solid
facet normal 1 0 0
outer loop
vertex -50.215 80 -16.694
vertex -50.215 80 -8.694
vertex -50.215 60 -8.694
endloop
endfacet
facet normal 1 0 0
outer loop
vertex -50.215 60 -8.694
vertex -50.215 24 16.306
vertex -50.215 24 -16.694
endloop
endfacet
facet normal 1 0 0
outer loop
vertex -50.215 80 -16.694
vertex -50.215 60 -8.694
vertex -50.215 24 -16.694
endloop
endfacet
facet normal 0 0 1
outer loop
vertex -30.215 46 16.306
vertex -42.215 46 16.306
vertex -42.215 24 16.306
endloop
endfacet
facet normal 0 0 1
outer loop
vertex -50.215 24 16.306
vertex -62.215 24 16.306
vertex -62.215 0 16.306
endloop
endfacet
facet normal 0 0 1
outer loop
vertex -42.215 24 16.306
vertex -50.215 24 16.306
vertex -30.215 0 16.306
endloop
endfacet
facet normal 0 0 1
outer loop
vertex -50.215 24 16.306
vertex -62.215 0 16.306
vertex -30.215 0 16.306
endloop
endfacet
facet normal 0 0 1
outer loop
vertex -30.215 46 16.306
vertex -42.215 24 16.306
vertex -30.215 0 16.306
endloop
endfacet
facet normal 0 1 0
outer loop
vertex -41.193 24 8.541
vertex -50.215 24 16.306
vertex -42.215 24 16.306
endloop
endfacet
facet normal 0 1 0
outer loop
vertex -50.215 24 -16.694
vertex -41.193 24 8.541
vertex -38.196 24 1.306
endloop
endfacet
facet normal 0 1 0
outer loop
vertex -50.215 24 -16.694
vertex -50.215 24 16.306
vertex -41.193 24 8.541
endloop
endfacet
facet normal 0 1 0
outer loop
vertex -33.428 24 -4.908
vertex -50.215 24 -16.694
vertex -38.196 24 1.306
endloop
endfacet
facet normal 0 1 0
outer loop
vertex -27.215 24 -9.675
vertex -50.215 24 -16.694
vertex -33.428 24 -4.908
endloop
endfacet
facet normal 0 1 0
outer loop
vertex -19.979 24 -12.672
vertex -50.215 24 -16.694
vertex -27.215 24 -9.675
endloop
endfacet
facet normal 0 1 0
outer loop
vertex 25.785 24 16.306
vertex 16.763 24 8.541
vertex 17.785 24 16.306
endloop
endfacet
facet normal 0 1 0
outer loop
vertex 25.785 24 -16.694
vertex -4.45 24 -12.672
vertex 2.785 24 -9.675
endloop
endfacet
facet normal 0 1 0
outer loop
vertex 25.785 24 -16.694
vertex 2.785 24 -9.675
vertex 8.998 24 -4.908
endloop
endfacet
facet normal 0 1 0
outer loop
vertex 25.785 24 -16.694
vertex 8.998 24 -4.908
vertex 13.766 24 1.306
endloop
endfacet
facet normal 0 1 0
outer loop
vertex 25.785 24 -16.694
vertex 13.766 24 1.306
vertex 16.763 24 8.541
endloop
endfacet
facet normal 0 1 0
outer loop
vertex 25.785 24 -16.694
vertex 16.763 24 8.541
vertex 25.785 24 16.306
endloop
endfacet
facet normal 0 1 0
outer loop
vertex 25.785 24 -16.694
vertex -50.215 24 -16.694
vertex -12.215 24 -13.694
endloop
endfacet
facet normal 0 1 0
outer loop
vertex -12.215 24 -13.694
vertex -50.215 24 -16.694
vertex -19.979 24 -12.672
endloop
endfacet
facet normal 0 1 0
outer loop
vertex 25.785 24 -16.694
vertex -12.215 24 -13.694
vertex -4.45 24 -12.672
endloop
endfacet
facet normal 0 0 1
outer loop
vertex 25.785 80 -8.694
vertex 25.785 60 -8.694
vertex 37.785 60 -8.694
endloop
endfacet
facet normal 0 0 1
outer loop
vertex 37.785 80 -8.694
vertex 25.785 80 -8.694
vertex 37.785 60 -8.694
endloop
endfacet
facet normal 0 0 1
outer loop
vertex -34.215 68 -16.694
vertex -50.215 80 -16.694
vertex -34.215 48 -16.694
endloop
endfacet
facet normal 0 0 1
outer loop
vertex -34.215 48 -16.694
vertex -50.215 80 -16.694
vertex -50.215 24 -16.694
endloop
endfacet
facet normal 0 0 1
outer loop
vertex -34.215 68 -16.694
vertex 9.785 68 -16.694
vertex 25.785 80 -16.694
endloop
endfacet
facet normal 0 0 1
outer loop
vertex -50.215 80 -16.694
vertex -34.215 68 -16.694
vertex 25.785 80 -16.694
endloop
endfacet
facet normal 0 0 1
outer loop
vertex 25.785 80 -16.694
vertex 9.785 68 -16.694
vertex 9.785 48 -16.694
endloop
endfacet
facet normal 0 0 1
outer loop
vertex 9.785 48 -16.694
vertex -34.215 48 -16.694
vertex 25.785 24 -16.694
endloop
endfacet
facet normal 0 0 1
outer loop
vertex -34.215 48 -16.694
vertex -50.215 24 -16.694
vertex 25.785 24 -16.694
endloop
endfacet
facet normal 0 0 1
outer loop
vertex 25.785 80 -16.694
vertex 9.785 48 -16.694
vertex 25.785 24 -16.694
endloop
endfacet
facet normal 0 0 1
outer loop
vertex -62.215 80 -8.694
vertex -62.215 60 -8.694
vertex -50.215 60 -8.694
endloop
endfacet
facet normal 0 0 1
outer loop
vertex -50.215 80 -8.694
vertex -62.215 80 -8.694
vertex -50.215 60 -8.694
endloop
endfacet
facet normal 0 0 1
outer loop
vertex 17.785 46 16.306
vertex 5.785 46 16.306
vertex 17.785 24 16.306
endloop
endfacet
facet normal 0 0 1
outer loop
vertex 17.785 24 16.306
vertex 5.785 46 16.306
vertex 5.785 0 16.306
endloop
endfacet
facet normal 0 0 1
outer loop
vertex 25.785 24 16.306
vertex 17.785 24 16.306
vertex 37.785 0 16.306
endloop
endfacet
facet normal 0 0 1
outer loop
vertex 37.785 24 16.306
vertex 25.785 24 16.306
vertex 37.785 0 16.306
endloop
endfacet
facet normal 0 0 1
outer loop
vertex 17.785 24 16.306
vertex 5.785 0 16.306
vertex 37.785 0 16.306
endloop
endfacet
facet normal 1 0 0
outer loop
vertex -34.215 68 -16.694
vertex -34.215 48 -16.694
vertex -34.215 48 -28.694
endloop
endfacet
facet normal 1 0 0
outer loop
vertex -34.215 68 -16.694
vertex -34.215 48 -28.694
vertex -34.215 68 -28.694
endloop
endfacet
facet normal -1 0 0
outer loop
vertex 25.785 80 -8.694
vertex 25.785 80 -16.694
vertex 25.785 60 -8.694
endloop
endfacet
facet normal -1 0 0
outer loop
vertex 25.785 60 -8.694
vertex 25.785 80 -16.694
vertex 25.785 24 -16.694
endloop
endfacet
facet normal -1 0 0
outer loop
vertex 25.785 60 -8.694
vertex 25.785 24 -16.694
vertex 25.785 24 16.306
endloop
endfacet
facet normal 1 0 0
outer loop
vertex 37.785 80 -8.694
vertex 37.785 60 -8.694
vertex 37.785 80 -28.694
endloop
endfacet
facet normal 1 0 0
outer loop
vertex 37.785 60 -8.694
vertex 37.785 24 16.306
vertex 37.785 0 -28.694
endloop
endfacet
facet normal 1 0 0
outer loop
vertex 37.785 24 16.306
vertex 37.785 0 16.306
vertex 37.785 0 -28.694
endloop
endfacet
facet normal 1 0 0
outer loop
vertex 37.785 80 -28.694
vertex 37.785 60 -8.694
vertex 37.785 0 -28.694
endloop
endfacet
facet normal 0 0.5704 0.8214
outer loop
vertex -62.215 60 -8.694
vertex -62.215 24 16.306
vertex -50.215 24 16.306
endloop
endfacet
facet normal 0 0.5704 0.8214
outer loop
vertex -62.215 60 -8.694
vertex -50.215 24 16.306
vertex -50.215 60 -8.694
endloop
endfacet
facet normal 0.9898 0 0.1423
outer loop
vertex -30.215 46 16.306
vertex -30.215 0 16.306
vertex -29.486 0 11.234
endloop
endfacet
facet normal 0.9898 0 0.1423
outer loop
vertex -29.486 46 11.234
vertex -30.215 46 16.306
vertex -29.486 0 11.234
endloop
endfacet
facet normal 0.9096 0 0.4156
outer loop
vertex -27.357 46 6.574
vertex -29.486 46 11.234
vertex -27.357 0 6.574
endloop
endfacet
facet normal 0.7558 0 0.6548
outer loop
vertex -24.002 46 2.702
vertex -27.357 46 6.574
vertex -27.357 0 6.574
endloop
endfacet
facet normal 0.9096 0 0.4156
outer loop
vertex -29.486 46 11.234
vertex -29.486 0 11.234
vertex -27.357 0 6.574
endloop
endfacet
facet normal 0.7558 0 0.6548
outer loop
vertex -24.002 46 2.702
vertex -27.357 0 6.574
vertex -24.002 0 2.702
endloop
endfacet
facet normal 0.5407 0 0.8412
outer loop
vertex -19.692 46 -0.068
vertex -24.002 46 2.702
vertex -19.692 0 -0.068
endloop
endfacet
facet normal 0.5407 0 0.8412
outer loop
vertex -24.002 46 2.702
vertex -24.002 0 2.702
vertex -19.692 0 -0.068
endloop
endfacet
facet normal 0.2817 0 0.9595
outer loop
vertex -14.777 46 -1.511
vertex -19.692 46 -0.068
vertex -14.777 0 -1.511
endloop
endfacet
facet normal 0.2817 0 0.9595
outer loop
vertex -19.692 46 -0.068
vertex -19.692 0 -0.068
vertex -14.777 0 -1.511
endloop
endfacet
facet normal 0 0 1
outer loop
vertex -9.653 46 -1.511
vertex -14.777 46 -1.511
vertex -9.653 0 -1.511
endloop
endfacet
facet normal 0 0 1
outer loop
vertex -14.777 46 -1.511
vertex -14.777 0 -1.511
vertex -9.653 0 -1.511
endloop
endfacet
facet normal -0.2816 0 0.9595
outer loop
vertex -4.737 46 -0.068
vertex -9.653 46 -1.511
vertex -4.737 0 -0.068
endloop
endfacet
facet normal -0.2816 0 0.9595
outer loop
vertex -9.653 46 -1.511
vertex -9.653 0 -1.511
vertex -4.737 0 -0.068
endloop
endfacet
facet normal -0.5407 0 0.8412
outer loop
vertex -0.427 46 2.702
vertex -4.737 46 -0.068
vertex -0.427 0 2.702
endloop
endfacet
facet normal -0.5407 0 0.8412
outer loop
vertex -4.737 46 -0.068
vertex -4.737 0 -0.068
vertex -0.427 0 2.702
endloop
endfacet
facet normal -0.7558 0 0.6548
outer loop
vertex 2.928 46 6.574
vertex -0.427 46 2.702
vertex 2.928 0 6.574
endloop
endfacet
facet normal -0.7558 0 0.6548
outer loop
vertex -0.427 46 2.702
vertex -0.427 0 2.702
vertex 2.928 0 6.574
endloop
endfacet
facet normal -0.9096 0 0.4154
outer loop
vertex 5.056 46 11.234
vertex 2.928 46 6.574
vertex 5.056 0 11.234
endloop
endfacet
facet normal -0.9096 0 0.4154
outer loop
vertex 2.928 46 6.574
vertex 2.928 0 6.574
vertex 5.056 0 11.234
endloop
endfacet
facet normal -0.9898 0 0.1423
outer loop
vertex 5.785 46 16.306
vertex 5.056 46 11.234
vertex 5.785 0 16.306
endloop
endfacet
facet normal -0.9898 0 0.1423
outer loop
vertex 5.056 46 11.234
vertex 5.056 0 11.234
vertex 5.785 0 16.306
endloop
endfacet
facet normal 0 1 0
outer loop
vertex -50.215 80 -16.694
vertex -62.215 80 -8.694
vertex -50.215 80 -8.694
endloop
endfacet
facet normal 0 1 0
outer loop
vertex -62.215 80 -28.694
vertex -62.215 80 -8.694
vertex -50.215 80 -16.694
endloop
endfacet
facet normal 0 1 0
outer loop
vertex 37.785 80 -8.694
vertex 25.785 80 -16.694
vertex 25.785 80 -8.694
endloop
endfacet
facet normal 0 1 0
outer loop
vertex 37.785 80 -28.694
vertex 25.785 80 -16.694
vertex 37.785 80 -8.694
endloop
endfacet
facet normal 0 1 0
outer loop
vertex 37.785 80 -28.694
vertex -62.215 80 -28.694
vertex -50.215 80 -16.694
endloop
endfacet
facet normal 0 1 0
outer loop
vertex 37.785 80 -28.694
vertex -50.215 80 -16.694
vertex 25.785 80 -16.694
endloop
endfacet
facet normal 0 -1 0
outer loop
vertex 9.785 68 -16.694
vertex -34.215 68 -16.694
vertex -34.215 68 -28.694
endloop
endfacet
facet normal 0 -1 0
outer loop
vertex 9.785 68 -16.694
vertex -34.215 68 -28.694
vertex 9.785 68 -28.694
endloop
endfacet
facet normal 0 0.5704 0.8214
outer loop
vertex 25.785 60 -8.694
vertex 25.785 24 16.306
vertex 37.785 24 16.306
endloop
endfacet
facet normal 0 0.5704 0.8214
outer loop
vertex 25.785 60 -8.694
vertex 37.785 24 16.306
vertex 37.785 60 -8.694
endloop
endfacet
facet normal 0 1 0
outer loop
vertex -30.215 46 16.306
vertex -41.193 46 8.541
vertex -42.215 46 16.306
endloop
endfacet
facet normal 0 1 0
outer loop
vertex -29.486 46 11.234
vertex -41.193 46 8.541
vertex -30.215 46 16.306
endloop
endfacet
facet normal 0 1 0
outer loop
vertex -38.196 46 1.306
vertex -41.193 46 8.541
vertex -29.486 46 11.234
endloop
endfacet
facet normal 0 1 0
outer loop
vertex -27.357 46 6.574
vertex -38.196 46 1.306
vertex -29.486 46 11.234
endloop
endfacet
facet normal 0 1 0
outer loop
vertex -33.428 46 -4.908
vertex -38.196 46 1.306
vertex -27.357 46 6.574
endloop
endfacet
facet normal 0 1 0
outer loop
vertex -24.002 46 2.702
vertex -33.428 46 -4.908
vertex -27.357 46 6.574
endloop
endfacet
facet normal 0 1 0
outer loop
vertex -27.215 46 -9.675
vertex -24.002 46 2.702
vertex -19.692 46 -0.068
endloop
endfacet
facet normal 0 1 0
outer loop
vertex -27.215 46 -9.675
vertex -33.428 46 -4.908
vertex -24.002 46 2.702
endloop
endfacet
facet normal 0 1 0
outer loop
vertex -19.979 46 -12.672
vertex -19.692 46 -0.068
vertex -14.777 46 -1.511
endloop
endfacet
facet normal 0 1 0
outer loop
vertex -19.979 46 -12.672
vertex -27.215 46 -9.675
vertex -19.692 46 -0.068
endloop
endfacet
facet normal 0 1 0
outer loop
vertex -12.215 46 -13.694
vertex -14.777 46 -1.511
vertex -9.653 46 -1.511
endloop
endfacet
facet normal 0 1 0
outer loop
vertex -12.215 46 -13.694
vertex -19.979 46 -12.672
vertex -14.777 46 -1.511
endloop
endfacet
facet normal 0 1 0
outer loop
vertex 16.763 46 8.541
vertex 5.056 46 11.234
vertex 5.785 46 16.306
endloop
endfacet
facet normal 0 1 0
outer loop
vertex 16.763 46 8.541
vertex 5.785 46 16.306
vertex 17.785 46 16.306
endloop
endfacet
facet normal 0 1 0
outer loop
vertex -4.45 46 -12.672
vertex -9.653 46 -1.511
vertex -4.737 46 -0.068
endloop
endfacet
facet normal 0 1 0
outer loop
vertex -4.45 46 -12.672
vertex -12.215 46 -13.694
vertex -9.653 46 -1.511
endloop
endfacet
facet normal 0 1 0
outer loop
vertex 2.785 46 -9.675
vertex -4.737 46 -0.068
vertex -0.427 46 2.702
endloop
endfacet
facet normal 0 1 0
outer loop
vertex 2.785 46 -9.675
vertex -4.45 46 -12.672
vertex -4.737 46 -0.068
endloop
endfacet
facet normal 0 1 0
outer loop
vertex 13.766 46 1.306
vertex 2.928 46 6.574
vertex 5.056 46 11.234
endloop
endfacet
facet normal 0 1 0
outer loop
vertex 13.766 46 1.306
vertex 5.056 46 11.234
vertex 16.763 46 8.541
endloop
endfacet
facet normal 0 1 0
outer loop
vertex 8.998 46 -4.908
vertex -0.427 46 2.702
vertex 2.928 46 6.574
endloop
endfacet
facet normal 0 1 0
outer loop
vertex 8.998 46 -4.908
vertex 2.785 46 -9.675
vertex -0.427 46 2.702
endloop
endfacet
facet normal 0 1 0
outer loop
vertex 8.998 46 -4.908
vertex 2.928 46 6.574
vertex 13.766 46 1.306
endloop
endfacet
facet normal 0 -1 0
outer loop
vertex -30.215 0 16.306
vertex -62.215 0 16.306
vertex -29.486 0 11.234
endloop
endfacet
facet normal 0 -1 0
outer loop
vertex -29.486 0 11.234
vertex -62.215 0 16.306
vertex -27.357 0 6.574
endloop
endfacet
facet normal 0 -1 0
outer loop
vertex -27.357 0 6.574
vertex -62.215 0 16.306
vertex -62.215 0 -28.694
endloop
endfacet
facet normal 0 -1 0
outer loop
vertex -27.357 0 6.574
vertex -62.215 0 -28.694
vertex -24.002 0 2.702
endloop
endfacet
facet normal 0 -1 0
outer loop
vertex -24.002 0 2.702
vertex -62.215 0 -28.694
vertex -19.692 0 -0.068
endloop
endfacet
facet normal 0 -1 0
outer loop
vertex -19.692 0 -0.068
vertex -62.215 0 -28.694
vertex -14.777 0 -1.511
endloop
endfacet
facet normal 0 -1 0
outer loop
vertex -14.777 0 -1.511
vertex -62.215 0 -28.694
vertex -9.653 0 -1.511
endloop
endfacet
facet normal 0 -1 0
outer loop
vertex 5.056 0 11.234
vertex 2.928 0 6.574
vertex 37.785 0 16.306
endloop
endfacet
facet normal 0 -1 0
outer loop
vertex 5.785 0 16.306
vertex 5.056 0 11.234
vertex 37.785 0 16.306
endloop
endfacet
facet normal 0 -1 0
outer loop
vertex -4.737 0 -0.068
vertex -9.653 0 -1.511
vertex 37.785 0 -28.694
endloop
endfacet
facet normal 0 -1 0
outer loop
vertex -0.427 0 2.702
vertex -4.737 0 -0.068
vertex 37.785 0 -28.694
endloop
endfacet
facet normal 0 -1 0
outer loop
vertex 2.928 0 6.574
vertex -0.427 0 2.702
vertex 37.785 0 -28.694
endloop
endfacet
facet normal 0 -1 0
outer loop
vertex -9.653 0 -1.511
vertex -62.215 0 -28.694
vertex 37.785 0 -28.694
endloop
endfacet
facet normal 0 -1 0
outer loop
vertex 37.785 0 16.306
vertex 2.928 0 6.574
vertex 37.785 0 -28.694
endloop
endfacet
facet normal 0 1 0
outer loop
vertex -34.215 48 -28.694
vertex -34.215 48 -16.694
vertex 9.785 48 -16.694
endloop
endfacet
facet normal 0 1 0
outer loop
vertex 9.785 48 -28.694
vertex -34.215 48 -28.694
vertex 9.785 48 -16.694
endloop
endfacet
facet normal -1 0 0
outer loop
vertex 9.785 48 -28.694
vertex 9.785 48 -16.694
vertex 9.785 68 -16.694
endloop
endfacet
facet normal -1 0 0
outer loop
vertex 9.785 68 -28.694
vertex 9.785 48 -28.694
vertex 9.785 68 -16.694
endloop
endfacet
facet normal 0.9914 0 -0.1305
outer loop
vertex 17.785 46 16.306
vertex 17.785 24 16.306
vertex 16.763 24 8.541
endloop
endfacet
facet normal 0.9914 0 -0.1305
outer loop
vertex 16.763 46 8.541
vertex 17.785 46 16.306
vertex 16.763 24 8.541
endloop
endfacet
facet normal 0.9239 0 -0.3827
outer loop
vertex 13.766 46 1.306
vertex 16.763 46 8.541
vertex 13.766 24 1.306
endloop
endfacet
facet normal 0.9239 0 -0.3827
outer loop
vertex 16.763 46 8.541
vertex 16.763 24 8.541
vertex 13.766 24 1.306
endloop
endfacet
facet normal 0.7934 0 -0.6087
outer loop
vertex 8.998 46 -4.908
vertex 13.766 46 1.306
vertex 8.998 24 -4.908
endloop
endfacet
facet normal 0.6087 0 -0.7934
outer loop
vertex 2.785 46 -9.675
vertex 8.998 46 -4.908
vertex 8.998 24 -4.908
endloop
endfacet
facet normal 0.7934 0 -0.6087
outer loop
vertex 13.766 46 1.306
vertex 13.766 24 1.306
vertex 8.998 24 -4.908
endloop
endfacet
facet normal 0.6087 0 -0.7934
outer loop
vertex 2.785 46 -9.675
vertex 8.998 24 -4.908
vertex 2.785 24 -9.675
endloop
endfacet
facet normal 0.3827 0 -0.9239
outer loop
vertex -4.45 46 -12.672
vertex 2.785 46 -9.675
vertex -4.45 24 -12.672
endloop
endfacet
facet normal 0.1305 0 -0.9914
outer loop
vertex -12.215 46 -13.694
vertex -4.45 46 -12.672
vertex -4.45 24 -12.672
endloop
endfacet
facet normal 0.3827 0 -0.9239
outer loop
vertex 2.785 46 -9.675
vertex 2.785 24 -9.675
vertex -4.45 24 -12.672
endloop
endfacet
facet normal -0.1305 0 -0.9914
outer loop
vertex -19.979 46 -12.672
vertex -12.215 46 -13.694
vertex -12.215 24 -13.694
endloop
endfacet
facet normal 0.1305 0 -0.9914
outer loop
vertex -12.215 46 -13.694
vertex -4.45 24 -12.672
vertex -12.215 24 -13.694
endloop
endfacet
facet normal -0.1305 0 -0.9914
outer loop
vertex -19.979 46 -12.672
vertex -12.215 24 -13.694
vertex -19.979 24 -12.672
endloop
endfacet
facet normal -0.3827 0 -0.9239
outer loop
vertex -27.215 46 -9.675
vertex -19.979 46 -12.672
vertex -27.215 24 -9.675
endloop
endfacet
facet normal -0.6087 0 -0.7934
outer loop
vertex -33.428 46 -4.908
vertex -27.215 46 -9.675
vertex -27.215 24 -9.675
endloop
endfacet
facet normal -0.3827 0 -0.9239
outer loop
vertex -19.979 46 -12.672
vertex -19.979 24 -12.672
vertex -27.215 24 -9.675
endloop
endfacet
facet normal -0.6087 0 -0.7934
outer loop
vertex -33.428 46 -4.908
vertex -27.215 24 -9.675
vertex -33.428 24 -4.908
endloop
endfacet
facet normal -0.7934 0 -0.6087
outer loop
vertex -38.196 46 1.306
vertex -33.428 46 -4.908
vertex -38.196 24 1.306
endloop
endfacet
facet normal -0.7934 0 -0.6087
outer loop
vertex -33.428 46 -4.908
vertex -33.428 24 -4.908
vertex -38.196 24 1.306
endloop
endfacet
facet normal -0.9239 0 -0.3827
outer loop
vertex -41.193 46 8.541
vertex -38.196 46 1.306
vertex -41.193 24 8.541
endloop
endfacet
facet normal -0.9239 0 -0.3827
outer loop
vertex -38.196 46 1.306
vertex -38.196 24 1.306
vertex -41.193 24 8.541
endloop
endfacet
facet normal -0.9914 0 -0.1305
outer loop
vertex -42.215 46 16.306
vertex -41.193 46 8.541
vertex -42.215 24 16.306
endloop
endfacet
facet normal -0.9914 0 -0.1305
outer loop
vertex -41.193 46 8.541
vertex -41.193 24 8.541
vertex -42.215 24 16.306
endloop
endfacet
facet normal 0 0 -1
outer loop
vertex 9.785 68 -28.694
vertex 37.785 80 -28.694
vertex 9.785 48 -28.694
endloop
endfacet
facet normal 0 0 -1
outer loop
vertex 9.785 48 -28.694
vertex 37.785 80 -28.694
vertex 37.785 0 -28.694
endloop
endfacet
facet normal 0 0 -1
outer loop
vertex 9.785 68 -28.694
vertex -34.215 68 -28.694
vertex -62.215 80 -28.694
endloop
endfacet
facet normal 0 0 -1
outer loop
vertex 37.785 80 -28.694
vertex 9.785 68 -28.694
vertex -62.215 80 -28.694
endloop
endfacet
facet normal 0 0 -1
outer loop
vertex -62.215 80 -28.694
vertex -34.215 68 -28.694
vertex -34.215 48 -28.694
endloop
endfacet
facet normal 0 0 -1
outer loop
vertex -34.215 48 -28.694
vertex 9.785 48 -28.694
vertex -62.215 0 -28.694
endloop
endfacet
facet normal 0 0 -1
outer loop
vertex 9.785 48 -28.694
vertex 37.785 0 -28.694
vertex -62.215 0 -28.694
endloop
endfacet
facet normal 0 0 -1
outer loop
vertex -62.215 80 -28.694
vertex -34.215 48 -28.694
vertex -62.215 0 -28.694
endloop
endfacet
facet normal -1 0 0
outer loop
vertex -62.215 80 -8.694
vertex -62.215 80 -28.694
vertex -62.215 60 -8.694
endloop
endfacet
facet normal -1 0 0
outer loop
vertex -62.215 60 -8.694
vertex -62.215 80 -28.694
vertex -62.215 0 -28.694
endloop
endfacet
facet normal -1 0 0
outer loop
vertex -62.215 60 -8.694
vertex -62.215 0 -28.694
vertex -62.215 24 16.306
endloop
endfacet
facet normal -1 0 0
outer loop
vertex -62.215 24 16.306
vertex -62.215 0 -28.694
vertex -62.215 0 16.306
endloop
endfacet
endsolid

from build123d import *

# Parameters (mm, degrees)
BOSS_EXTRUDE1_DEPTH = 24
SKETCH1_4_W         = 12
SKETCH1_4_H         = 25
BOSS_EXTRUDE3_DEPTH = 60
BOSS_EXTRUDE5_DEPTH = 80
CUT_EXTRUDE4_DEPTH  = 104
BOSS_EXTRUDE6_DEPTH = 46
SKETCH5_W           = 44
SKETCH5_H           = 20
CUT_EXTRUDE5_DEPTH  = 46


with BuildPart() as part:
    # Sketch1 → Boss-Extrude1 (new body)
    with BuildSketch(Plane(origin=(0, 0, 0), x_dir=(1, 0, 0), z_dir=(0, 1, 0))):
        with BuildLine():
            Line((-50.214859888, 8.694484644), (-50.214859888, -16.305515356))
            Line((-50.214859888, -16.305515356), (-42.214859888, -16.305515356))
            ThreePointArc((-42.214859888, -16.305515356), (-12.214859888, 13.694484644), (17.785140112, -16.305515356))
            Line((17.785140112, -16.305515356), (25.785140112, -16.305515356))
            Line((25.785140112, -16.305515356), (25.785140112, 8.694484644))
            Line((25.785140112, 8.694484644), (25.785140112, 16.694484644))
            Line((25.785140112, 16.694484644), (-50.214859888, 16.694484644))
            Line((-50.214859888, 16.694484644), (-50.214859888, 8.694484644))
        make_face()
    extrude(amount=BOSS_EXTRUDE1_DEPTH)

    # Sketch1<4> → Boss-Extrude3 (add)
    with BuildSketch(Plane(origin=(0, 0, 0), x_dir=(1, 0, 0), z_dir=(0, 1, 0))):
        with Locations((-56.214859888, -3.805515356)):
            Rectangle(SKETCH1_4_W, SKETCH1_4_H)
        with Locations((31.785140112, -3.805515356)):
            Rectangle(SKETCH1_4_W, SKETCH1_4_H)
    extrude(amount=BOSS_EXTRUDE3_DEPTH)

    # Sketch1<7> → Boss-Extrude5 (add)
    with BuildSketch(Plane(origin=(0, 0, 0), x_dir=(1, 0, 0), z_dir=(0, 1, 0))):
        Polygon((-62.214859888, 28.694484644), (-62.214859888, 8.694484644), (-50.214859888, 8.694484644), (-50.214859888, 16.694484644), (25.785140112, 16.694484644), (25.785140112, 8.694484644), (37.785140112, 8.694484644), (37.785140112, 28.694484644), align=None)
    extrude(amount=BOSS_EXTRUDE5_DEPTH)

    # Sketch3 → Cut-Extrude4 (cut)
    with BuildSketch(Plane.ZY.offset(62.214859888)):
        Polygon((16.305515356, 24), (-8.694484644, 60), (16.305515356, 60), align=None)
    extrude(amount=-CUT_EXTRUDE4_DEPTH, mode=Mode.SUBTRACT)

    # Sketch1<8> → Boss-Extrude6 (add)
    with BuildSketch(Plane(origin=(0, 0, 0), x_dir=(1, 0, 0), z_dir=(0, 1, 0))):
        with BuildLine():
            ThreePointArc((17.785140112, -16.305515356), (-12.214859888, 13.694484644), (-42.214859888, -16.305515356))
            Line((-42.214859888, -16.305515356), (-30.214859888, -16.305515356))
            ThreePointArc((-30.214859888, -16.305515356), (-12.214859888, 1.694484644), (5.785140112, -16.305515356))
            Line((5.785140112, -16.305515356), (17.785140112, -16.305515356))
        make_face()
    extrude(amount=BOSS_EXTRUDE6_DEPTH)

    # Sketch5 → Cut-Extrude5 (cut)
    with BuildSketch(Plane.XY.offset(-16.694484644)):
        with Locations((-12.214859888, 58)):
            Rectangle(SKETCH5_W, SKETCH5_H)
    extrude(amount=-CUT_EXTRUDE5_DEPTH, mode=Mode.SUBTRACT)


solid = part.part
